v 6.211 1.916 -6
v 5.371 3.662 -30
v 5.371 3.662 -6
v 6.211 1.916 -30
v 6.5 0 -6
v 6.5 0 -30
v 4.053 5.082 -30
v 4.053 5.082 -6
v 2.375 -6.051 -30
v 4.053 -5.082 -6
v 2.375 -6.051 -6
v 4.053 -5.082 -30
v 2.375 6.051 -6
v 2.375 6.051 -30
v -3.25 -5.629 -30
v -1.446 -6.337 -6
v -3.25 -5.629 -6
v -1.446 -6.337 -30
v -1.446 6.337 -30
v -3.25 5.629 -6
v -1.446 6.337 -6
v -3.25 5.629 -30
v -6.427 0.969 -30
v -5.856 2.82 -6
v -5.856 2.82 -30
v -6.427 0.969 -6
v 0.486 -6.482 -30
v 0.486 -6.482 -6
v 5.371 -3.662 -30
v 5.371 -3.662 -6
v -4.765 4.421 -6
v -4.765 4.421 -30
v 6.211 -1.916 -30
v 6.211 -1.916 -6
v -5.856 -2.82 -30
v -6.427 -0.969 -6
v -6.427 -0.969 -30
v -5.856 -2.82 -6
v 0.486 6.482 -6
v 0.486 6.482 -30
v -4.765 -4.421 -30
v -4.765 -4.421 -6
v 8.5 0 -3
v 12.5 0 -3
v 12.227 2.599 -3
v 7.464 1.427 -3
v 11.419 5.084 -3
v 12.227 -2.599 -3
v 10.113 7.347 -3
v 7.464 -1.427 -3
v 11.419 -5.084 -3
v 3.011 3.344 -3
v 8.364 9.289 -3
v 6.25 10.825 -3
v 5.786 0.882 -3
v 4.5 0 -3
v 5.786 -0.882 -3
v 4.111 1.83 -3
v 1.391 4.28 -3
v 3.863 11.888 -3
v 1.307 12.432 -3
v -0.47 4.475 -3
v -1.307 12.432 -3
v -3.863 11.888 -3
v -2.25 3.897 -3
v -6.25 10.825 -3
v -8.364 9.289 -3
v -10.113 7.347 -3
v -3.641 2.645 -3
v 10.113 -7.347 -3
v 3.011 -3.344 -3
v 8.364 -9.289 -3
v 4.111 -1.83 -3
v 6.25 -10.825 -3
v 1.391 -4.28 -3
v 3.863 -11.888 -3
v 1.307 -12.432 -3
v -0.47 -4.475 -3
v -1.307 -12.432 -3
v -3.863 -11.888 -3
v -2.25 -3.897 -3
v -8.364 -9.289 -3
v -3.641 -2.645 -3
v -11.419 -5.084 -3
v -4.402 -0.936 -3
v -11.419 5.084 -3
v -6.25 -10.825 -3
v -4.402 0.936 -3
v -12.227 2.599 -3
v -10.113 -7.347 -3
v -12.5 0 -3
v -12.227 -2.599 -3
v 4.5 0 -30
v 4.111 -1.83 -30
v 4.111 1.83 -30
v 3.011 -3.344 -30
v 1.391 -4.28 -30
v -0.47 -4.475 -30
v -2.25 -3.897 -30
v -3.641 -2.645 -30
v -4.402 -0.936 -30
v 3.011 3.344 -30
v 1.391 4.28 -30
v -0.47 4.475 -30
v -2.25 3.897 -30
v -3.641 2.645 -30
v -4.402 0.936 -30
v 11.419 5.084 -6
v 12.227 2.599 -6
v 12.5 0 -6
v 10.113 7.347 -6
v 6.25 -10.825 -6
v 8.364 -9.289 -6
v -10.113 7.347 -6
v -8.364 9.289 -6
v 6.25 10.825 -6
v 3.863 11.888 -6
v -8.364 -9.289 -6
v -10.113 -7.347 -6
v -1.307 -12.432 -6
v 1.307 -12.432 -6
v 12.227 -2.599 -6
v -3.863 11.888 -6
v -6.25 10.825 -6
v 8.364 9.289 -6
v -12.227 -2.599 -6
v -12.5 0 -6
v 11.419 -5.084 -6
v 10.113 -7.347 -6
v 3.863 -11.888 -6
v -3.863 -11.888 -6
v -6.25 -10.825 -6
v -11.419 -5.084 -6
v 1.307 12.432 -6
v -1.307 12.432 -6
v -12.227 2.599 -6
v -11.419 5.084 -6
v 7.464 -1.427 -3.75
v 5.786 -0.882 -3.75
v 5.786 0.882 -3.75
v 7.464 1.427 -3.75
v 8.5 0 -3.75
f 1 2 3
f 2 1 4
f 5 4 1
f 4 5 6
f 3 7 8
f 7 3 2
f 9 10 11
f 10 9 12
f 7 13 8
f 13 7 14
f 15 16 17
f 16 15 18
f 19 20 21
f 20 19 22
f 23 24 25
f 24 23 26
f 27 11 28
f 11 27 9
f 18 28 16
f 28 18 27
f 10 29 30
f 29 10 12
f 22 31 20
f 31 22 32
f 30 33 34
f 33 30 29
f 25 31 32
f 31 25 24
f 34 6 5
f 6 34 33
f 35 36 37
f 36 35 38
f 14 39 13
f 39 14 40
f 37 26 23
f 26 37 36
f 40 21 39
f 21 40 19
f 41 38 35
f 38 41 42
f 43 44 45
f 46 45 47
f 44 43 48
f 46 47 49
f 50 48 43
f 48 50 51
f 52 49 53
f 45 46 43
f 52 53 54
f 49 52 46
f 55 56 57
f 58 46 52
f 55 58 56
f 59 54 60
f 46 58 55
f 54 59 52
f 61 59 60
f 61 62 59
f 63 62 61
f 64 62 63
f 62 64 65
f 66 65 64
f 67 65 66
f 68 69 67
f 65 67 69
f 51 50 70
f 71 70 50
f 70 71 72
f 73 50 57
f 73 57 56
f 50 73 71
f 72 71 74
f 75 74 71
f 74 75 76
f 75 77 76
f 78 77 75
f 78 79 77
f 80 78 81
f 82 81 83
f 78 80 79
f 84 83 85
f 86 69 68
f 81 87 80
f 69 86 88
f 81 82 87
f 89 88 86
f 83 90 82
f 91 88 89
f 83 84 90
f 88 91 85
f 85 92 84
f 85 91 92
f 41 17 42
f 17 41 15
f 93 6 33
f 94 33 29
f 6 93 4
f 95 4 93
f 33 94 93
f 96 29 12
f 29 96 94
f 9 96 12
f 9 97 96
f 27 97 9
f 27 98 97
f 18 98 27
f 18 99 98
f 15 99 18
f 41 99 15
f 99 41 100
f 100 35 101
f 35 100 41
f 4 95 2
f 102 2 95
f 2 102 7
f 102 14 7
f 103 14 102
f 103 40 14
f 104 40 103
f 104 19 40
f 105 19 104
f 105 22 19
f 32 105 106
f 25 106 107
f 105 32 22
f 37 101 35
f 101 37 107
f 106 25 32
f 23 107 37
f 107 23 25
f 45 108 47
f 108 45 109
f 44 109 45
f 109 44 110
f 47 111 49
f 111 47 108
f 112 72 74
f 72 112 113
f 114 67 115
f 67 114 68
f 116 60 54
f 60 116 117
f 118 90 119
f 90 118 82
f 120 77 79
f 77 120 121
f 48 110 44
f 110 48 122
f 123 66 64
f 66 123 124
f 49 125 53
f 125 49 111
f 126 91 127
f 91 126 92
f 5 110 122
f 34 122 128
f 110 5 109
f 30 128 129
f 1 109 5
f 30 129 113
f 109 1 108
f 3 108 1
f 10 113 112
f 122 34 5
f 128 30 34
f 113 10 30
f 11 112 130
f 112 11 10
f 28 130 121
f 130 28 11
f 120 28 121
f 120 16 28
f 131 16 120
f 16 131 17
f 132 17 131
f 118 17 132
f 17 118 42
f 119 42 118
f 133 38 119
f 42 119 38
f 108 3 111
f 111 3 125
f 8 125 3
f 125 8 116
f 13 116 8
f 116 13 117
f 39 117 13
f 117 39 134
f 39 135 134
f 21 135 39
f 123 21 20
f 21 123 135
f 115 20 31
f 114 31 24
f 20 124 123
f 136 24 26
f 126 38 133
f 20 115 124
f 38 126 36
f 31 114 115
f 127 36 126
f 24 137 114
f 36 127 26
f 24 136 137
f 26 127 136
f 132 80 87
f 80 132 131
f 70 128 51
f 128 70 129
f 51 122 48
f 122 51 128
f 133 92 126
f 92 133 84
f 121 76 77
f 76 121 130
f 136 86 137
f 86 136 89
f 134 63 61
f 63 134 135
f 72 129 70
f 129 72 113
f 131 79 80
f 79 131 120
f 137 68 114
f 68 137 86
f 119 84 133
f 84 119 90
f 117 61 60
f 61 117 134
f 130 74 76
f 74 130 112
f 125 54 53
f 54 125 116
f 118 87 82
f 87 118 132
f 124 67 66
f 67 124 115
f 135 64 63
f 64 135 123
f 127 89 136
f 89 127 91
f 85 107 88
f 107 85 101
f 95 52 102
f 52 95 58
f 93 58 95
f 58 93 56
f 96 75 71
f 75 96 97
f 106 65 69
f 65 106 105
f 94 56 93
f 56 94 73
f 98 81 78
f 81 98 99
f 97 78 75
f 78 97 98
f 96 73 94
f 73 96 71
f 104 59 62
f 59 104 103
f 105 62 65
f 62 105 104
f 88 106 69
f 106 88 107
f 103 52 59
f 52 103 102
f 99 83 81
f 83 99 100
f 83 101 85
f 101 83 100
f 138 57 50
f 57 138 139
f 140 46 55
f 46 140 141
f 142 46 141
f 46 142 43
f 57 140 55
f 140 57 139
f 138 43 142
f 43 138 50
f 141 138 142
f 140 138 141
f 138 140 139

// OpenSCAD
m = 10;
g=2;
h=13;
l = 15;
w = 3;
inch=25;
b = m+(g+w)*2;
echo(b);


difference() {
union(){
//sphere(r=g+m/2);
translate([0,0,-3])
mirror([0,0,1]){
    cylinder(r=h/2,h = m+g+l);
    cylinder(r = inch/2, h = w);
};
%translate([-50,-25/2,-3])cube([100,25,3]);
%translate([-50,25/2-w,-25])cube([100,3,25]);
}

translate([0,0,-50])cylinder(r=(h/2)-g,h=100);

translate([b/2-3,0,0])cylinder(r=3/2,h=l/2,center=true);
}
